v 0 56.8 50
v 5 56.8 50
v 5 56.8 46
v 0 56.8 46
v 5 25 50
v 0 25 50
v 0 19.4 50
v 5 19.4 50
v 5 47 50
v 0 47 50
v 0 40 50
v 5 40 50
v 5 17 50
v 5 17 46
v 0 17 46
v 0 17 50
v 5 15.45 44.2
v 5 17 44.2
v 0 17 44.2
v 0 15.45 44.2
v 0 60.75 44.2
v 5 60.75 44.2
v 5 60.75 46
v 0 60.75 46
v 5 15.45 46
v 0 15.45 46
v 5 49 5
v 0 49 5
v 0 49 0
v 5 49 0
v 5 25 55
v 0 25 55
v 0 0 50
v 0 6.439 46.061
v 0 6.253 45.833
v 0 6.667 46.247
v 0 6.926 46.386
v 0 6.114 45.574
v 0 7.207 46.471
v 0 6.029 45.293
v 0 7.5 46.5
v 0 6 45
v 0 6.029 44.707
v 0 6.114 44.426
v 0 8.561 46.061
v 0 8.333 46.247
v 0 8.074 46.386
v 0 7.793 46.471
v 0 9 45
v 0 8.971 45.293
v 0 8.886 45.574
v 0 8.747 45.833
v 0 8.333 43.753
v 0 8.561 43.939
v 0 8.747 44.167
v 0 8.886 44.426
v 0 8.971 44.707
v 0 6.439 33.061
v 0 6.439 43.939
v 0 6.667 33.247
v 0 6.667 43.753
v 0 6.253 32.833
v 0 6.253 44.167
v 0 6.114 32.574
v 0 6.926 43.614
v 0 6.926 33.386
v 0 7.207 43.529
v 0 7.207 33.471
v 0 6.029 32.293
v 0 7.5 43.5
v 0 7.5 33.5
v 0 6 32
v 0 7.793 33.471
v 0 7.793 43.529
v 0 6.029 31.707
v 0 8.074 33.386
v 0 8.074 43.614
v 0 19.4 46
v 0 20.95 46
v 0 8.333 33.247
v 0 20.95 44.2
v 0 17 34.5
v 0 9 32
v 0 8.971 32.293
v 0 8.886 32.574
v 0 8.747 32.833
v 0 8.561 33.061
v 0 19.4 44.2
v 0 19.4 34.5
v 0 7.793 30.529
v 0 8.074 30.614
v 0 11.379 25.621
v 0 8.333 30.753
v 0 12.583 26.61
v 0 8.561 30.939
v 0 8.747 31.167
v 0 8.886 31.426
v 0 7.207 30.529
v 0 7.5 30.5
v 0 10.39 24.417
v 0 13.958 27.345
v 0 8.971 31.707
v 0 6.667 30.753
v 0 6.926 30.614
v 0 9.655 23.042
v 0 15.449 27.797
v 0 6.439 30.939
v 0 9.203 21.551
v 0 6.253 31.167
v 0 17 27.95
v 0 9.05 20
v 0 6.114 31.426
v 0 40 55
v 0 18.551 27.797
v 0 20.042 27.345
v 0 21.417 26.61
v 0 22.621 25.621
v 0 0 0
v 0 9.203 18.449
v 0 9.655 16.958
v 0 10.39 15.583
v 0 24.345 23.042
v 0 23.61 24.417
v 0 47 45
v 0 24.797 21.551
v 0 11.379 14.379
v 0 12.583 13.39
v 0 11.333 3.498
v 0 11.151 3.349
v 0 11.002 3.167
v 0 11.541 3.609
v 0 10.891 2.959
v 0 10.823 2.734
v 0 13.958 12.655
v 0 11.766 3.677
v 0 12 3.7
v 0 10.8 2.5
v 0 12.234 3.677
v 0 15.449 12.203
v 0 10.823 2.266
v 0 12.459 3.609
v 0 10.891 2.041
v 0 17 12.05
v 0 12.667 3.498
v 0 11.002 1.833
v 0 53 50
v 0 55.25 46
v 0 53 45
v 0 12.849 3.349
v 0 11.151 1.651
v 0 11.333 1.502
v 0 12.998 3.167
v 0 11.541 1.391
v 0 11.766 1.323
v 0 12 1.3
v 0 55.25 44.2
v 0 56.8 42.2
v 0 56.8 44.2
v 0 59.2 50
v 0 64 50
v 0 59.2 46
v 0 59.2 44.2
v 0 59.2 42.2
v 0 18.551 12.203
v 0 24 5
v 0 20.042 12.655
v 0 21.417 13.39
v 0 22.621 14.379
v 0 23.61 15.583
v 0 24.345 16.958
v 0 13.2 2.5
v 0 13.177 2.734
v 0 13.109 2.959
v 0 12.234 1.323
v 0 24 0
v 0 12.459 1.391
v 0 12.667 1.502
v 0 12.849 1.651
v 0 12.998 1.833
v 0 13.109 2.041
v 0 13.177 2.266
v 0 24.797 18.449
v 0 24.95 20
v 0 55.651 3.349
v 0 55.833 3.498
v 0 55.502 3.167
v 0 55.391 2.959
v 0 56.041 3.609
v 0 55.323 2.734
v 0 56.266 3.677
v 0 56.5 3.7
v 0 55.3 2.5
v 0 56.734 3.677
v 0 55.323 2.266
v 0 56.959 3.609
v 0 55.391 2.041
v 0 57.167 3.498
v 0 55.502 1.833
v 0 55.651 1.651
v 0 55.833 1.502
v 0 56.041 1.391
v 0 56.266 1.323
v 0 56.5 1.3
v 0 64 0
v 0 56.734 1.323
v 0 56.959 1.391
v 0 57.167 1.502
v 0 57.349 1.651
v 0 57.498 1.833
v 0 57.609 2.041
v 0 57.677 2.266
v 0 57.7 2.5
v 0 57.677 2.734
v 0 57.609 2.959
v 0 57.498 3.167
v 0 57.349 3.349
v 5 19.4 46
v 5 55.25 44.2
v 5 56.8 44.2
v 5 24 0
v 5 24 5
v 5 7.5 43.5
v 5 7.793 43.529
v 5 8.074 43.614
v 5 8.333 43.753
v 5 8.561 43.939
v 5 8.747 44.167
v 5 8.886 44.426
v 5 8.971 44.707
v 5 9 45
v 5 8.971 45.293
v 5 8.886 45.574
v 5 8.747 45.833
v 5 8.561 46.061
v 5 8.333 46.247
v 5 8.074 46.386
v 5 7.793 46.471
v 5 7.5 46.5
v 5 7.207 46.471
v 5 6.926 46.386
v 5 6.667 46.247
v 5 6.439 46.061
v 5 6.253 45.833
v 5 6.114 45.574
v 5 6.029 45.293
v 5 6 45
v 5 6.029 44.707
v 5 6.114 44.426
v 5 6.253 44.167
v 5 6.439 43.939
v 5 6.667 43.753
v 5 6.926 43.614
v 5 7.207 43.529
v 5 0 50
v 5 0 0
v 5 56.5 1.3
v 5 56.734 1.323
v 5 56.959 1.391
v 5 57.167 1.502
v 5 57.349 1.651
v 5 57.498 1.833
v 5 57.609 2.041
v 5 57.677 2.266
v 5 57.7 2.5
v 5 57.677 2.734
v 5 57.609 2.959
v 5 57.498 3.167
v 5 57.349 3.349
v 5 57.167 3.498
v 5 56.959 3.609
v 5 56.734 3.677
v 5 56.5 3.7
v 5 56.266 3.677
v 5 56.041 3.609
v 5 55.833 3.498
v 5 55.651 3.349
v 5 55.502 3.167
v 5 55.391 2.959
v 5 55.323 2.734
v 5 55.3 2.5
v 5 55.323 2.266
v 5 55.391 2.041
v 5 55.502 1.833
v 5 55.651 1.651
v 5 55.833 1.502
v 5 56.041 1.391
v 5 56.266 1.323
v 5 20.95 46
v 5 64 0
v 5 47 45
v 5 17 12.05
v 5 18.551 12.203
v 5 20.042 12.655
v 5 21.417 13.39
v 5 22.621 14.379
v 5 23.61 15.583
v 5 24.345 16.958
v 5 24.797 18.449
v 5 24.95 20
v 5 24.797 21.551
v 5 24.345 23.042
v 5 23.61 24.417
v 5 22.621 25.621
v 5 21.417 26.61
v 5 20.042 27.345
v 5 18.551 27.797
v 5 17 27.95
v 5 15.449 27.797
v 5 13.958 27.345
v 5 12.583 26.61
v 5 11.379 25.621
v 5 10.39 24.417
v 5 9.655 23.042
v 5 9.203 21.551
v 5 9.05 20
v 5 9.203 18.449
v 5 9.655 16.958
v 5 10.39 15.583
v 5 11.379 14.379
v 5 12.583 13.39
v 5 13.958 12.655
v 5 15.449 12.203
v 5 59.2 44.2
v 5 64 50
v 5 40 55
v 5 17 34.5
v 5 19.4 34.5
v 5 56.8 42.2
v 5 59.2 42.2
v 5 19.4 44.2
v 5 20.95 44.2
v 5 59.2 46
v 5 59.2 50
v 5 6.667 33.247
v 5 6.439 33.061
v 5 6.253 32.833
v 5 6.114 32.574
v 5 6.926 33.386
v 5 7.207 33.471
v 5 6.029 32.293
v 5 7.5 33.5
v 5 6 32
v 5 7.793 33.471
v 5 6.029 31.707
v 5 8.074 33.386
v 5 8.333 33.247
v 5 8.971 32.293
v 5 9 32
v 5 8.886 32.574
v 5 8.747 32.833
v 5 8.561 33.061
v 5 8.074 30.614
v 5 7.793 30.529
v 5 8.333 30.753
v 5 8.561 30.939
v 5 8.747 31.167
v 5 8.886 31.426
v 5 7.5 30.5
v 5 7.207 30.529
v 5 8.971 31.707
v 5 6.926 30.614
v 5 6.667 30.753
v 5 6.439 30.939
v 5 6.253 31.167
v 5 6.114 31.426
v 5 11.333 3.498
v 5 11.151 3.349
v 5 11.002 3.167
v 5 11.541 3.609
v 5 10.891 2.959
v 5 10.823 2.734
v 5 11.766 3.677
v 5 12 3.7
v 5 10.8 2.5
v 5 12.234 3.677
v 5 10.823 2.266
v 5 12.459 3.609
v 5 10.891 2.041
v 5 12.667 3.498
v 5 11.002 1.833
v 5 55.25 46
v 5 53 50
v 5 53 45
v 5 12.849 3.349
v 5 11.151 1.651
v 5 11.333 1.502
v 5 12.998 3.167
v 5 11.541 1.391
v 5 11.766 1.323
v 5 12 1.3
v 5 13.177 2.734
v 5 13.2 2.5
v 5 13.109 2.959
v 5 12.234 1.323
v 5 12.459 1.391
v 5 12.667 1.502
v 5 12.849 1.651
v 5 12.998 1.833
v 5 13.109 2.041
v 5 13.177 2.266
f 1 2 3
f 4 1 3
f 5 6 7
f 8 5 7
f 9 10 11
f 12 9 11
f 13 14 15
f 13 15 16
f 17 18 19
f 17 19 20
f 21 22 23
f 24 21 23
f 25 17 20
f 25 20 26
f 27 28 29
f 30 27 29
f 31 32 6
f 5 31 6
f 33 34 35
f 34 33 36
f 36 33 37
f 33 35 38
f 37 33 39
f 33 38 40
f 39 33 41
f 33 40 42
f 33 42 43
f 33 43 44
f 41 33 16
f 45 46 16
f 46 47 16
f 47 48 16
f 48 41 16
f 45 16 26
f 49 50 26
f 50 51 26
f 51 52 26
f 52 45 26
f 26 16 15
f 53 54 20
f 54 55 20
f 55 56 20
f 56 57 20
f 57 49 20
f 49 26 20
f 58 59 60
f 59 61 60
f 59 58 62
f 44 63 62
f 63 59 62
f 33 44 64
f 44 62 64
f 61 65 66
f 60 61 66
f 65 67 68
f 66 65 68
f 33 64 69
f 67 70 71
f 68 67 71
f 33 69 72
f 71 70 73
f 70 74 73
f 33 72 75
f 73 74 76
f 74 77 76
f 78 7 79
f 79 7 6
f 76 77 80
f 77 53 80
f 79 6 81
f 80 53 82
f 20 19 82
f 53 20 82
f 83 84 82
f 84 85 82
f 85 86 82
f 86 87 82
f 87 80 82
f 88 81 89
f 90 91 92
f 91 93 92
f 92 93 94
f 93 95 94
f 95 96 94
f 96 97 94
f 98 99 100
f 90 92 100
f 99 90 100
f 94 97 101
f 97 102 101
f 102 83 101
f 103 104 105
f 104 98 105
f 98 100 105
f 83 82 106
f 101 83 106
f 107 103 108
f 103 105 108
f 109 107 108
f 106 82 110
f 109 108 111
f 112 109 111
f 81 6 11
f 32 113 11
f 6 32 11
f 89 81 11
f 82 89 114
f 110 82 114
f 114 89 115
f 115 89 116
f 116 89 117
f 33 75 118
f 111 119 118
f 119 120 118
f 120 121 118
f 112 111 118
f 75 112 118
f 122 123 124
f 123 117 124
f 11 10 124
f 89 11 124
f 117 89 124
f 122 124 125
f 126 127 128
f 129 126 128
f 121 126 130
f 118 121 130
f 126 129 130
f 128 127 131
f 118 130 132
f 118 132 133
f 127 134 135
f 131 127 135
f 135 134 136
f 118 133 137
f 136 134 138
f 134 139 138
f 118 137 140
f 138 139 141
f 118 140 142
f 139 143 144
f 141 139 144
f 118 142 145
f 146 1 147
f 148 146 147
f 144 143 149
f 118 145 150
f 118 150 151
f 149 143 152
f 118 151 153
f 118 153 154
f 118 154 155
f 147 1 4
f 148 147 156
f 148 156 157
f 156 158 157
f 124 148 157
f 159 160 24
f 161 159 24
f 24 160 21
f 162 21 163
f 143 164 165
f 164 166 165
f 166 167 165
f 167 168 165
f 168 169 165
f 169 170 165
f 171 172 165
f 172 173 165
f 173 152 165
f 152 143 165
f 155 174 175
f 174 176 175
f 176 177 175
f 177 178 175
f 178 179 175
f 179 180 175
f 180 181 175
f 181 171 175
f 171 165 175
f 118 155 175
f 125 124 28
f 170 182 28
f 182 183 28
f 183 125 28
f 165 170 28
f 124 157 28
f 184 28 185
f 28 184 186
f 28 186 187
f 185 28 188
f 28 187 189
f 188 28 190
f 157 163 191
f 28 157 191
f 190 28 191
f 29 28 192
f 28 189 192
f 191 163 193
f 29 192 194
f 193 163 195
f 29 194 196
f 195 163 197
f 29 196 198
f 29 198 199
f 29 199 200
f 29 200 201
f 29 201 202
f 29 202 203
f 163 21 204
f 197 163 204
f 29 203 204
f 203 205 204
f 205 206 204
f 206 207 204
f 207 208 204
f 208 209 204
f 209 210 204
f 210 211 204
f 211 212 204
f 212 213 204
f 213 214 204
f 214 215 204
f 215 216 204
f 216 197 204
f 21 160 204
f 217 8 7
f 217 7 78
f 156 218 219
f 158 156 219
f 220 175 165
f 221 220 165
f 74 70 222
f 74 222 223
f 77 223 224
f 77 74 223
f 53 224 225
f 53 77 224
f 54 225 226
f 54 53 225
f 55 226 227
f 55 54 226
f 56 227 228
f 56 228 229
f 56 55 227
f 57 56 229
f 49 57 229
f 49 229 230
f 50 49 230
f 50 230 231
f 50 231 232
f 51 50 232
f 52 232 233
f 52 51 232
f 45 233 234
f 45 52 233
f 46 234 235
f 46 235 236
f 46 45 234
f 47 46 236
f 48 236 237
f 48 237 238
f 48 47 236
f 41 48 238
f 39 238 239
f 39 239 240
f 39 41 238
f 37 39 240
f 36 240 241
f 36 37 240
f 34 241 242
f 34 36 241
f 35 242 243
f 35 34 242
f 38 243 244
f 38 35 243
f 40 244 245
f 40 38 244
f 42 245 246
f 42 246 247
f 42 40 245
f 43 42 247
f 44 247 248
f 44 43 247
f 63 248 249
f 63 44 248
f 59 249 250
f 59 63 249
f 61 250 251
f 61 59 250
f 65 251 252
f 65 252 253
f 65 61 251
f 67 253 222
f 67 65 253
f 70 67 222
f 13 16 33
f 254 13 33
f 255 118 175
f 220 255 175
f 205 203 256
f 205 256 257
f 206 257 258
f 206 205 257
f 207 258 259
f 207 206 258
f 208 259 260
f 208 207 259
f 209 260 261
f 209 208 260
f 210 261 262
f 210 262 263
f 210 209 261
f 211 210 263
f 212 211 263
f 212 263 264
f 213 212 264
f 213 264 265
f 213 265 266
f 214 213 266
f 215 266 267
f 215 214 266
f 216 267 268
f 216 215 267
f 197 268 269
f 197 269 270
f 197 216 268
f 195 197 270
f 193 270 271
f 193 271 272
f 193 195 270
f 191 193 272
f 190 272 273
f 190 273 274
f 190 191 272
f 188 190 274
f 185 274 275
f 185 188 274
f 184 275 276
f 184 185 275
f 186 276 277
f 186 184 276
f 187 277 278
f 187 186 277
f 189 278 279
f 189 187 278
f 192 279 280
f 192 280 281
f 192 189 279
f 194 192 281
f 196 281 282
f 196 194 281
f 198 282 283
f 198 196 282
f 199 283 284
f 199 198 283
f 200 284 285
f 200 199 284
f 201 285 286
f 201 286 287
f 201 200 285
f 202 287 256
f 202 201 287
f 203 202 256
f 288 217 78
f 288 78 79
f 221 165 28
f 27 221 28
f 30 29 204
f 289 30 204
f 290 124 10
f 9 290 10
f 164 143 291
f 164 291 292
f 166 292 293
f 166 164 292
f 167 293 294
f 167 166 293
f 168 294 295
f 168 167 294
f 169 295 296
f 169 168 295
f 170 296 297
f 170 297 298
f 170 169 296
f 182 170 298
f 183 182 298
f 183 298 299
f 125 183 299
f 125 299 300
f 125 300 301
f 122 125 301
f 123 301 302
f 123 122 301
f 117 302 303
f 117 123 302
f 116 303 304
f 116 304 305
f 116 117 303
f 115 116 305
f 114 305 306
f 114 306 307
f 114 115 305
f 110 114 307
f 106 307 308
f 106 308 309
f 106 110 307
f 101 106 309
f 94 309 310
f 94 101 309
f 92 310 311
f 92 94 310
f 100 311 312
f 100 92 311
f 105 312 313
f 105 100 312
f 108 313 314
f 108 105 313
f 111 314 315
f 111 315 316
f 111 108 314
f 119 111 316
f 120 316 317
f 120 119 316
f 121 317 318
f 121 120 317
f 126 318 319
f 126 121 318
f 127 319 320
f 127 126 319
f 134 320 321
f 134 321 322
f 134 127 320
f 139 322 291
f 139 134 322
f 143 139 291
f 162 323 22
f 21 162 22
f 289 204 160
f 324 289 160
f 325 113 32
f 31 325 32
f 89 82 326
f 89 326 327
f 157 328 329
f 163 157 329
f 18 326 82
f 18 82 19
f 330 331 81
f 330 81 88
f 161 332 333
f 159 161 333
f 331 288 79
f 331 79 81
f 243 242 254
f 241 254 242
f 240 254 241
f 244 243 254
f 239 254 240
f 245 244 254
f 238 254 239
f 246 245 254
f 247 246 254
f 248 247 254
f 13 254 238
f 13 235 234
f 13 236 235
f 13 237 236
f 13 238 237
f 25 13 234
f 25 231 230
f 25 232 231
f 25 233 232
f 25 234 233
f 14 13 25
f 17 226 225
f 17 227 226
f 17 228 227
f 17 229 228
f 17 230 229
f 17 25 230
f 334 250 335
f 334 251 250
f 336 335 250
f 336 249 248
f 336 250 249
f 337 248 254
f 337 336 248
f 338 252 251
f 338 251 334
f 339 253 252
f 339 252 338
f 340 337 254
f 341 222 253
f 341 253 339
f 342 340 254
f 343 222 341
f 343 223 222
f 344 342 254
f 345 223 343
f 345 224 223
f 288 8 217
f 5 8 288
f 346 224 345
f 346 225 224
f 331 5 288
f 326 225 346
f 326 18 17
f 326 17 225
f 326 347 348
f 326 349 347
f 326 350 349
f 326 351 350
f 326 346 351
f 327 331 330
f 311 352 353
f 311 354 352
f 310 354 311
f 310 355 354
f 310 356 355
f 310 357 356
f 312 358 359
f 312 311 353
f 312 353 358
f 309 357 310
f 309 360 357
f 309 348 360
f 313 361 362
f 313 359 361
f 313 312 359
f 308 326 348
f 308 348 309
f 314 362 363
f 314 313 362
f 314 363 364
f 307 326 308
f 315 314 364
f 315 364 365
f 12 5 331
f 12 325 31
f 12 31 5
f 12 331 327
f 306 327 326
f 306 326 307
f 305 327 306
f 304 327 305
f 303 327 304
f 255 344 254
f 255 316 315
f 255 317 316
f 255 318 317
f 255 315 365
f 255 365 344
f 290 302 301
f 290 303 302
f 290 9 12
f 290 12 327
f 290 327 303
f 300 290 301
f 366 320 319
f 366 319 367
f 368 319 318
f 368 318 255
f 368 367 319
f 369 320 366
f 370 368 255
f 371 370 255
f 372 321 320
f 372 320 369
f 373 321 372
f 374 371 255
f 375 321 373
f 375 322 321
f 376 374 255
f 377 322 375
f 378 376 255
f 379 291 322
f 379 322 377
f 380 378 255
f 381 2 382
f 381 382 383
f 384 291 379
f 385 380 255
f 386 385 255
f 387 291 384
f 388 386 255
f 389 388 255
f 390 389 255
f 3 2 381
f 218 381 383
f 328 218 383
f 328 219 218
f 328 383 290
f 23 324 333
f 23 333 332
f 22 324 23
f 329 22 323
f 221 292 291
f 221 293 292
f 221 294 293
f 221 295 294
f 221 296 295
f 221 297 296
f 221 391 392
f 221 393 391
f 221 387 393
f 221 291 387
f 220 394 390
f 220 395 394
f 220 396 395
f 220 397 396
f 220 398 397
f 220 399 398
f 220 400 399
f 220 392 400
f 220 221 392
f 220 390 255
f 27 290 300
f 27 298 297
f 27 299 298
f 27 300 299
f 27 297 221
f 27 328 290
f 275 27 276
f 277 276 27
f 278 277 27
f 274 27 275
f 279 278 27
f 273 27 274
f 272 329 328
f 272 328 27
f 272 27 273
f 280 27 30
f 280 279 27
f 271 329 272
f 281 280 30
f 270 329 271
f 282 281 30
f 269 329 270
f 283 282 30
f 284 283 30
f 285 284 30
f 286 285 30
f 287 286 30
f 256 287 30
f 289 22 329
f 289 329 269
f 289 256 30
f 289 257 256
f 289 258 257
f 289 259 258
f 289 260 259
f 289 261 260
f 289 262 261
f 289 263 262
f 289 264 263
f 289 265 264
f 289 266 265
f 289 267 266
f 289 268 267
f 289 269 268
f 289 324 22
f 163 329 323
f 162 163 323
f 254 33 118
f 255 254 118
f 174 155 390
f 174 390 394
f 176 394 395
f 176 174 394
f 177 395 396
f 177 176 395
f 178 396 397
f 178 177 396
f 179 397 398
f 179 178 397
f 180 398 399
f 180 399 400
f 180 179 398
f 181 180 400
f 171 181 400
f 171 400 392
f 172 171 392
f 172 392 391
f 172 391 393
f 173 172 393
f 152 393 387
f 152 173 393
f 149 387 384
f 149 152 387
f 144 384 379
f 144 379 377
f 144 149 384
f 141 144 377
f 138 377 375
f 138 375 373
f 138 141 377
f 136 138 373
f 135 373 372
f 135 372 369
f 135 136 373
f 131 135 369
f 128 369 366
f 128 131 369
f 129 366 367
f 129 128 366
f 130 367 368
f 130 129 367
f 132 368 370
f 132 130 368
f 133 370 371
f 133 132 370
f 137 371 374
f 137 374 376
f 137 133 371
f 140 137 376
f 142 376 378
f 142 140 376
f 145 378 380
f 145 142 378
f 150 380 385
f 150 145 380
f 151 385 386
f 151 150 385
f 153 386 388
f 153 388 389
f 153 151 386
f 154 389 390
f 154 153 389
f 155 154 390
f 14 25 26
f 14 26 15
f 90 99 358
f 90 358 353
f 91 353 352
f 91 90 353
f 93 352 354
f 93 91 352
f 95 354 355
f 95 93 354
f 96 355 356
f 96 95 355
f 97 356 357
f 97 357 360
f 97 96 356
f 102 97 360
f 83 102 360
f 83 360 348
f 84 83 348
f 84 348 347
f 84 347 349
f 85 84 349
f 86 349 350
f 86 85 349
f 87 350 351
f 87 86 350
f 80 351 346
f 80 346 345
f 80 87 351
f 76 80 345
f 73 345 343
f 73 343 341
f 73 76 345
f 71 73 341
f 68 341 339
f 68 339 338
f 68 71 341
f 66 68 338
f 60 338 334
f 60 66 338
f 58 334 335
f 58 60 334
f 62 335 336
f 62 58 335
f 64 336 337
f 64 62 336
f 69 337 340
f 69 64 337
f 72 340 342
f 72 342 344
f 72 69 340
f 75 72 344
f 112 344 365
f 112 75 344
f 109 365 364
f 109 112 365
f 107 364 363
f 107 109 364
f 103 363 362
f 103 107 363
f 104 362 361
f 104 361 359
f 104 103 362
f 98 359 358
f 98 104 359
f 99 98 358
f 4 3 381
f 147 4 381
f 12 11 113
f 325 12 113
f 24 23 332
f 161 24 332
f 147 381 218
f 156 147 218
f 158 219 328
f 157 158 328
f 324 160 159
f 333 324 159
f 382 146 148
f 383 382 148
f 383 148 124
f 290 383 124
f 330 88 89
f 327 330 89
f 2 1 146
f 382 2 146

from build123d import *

# Parameters (mm, degrees)
SKETCH1_R           = 7.95
SKETCH1_R_2         = 1.5
SKETCH1_R_3         = 1.2
SKETCH1_W           = 8
SKETCH1_H           = 2.4
BOSS_EXTRUDE1_DEPTH = 5
CUT_EXTRUDE1_DEPTH  = 6


with BuildPart() as part:
    # Sketch1 → Boss-Extrude1 (new body)
    with BuildSketch(Plane(origin=(0, 0, 0), x_dir=(0, 0, -1), z_dir=(1, 0, 0))):
        Polygon((-50, 0), (0, 0), (0, 24), (-5, 24), (-5, 49), (0, 49), (0, 64), (-50, 64), (-50, 53), (-45, 53), (-45, 47), (-50, 47), (-50, 40), (-55, 40), (-55, 25), (-50, 25), align=None)
        with Locations((-20, 17)):
            Circle(SKETCH1_R, mode=Mode.SUBTRACT)
        with Locations((-45, 7.5)):
            Circle(SKETCH1_R_2, mode=Mode.SUBTRACT)
        with Locations((-32, 7.5)):
            Circle(SKETCH1_R_2, mode=Mode.SUBTRACT)
        with Locations((-2.5, 56.5)):
            Circle(SKETCH1_R_3, mode=Mode.SUBTRACT)
        with Locations((-2.5, 12)):
            Circle(SKETCH1_R_3, mode=Mode.SUBTRACT)
        with Locations((-38.5, 18.2)):
            Rectangle(SKETCH1_W, SKETCH1_H, mode=Mode.SUBTRACT)
    extrude(amount=BOSS_EXTRUDE1_DEPTH)

    # Sketch2 → Cut-Extrude1 (cut, through all)
    with BuildSketch(Plane(origin=(5, 0, 0), x_dir=(0, 0, -1), z_dir=(1, 0, 0))):
        Polygon((-50, 56.8), (-46, 56.8), (-46, 55.25), (-44.2, 55.25), (-44.2, 56.8), (-42.2, 56.8), (-42.2, 59.2), (-44.2, 59.2), (-44.2, 60.75), (-46, 60.75), (-46, 59.2), (-50, 59.2), align=None)
        Polygon((-44.2, 19.4), (-42.2, 19.4), (-42.2, 17), (-44.2, 17), (-44.2, 15.45), (-46, 15.45), (-46, 17), (-50, 17), (-50, 19.4), (-46, 19.4), (-46, 20.95), (-44.2, 20.95), align=None)
    extrude(amount=-CUT_EXTRUDE1_DEPTH, mode=Mode.SUBTRACT)


solid = part.part
